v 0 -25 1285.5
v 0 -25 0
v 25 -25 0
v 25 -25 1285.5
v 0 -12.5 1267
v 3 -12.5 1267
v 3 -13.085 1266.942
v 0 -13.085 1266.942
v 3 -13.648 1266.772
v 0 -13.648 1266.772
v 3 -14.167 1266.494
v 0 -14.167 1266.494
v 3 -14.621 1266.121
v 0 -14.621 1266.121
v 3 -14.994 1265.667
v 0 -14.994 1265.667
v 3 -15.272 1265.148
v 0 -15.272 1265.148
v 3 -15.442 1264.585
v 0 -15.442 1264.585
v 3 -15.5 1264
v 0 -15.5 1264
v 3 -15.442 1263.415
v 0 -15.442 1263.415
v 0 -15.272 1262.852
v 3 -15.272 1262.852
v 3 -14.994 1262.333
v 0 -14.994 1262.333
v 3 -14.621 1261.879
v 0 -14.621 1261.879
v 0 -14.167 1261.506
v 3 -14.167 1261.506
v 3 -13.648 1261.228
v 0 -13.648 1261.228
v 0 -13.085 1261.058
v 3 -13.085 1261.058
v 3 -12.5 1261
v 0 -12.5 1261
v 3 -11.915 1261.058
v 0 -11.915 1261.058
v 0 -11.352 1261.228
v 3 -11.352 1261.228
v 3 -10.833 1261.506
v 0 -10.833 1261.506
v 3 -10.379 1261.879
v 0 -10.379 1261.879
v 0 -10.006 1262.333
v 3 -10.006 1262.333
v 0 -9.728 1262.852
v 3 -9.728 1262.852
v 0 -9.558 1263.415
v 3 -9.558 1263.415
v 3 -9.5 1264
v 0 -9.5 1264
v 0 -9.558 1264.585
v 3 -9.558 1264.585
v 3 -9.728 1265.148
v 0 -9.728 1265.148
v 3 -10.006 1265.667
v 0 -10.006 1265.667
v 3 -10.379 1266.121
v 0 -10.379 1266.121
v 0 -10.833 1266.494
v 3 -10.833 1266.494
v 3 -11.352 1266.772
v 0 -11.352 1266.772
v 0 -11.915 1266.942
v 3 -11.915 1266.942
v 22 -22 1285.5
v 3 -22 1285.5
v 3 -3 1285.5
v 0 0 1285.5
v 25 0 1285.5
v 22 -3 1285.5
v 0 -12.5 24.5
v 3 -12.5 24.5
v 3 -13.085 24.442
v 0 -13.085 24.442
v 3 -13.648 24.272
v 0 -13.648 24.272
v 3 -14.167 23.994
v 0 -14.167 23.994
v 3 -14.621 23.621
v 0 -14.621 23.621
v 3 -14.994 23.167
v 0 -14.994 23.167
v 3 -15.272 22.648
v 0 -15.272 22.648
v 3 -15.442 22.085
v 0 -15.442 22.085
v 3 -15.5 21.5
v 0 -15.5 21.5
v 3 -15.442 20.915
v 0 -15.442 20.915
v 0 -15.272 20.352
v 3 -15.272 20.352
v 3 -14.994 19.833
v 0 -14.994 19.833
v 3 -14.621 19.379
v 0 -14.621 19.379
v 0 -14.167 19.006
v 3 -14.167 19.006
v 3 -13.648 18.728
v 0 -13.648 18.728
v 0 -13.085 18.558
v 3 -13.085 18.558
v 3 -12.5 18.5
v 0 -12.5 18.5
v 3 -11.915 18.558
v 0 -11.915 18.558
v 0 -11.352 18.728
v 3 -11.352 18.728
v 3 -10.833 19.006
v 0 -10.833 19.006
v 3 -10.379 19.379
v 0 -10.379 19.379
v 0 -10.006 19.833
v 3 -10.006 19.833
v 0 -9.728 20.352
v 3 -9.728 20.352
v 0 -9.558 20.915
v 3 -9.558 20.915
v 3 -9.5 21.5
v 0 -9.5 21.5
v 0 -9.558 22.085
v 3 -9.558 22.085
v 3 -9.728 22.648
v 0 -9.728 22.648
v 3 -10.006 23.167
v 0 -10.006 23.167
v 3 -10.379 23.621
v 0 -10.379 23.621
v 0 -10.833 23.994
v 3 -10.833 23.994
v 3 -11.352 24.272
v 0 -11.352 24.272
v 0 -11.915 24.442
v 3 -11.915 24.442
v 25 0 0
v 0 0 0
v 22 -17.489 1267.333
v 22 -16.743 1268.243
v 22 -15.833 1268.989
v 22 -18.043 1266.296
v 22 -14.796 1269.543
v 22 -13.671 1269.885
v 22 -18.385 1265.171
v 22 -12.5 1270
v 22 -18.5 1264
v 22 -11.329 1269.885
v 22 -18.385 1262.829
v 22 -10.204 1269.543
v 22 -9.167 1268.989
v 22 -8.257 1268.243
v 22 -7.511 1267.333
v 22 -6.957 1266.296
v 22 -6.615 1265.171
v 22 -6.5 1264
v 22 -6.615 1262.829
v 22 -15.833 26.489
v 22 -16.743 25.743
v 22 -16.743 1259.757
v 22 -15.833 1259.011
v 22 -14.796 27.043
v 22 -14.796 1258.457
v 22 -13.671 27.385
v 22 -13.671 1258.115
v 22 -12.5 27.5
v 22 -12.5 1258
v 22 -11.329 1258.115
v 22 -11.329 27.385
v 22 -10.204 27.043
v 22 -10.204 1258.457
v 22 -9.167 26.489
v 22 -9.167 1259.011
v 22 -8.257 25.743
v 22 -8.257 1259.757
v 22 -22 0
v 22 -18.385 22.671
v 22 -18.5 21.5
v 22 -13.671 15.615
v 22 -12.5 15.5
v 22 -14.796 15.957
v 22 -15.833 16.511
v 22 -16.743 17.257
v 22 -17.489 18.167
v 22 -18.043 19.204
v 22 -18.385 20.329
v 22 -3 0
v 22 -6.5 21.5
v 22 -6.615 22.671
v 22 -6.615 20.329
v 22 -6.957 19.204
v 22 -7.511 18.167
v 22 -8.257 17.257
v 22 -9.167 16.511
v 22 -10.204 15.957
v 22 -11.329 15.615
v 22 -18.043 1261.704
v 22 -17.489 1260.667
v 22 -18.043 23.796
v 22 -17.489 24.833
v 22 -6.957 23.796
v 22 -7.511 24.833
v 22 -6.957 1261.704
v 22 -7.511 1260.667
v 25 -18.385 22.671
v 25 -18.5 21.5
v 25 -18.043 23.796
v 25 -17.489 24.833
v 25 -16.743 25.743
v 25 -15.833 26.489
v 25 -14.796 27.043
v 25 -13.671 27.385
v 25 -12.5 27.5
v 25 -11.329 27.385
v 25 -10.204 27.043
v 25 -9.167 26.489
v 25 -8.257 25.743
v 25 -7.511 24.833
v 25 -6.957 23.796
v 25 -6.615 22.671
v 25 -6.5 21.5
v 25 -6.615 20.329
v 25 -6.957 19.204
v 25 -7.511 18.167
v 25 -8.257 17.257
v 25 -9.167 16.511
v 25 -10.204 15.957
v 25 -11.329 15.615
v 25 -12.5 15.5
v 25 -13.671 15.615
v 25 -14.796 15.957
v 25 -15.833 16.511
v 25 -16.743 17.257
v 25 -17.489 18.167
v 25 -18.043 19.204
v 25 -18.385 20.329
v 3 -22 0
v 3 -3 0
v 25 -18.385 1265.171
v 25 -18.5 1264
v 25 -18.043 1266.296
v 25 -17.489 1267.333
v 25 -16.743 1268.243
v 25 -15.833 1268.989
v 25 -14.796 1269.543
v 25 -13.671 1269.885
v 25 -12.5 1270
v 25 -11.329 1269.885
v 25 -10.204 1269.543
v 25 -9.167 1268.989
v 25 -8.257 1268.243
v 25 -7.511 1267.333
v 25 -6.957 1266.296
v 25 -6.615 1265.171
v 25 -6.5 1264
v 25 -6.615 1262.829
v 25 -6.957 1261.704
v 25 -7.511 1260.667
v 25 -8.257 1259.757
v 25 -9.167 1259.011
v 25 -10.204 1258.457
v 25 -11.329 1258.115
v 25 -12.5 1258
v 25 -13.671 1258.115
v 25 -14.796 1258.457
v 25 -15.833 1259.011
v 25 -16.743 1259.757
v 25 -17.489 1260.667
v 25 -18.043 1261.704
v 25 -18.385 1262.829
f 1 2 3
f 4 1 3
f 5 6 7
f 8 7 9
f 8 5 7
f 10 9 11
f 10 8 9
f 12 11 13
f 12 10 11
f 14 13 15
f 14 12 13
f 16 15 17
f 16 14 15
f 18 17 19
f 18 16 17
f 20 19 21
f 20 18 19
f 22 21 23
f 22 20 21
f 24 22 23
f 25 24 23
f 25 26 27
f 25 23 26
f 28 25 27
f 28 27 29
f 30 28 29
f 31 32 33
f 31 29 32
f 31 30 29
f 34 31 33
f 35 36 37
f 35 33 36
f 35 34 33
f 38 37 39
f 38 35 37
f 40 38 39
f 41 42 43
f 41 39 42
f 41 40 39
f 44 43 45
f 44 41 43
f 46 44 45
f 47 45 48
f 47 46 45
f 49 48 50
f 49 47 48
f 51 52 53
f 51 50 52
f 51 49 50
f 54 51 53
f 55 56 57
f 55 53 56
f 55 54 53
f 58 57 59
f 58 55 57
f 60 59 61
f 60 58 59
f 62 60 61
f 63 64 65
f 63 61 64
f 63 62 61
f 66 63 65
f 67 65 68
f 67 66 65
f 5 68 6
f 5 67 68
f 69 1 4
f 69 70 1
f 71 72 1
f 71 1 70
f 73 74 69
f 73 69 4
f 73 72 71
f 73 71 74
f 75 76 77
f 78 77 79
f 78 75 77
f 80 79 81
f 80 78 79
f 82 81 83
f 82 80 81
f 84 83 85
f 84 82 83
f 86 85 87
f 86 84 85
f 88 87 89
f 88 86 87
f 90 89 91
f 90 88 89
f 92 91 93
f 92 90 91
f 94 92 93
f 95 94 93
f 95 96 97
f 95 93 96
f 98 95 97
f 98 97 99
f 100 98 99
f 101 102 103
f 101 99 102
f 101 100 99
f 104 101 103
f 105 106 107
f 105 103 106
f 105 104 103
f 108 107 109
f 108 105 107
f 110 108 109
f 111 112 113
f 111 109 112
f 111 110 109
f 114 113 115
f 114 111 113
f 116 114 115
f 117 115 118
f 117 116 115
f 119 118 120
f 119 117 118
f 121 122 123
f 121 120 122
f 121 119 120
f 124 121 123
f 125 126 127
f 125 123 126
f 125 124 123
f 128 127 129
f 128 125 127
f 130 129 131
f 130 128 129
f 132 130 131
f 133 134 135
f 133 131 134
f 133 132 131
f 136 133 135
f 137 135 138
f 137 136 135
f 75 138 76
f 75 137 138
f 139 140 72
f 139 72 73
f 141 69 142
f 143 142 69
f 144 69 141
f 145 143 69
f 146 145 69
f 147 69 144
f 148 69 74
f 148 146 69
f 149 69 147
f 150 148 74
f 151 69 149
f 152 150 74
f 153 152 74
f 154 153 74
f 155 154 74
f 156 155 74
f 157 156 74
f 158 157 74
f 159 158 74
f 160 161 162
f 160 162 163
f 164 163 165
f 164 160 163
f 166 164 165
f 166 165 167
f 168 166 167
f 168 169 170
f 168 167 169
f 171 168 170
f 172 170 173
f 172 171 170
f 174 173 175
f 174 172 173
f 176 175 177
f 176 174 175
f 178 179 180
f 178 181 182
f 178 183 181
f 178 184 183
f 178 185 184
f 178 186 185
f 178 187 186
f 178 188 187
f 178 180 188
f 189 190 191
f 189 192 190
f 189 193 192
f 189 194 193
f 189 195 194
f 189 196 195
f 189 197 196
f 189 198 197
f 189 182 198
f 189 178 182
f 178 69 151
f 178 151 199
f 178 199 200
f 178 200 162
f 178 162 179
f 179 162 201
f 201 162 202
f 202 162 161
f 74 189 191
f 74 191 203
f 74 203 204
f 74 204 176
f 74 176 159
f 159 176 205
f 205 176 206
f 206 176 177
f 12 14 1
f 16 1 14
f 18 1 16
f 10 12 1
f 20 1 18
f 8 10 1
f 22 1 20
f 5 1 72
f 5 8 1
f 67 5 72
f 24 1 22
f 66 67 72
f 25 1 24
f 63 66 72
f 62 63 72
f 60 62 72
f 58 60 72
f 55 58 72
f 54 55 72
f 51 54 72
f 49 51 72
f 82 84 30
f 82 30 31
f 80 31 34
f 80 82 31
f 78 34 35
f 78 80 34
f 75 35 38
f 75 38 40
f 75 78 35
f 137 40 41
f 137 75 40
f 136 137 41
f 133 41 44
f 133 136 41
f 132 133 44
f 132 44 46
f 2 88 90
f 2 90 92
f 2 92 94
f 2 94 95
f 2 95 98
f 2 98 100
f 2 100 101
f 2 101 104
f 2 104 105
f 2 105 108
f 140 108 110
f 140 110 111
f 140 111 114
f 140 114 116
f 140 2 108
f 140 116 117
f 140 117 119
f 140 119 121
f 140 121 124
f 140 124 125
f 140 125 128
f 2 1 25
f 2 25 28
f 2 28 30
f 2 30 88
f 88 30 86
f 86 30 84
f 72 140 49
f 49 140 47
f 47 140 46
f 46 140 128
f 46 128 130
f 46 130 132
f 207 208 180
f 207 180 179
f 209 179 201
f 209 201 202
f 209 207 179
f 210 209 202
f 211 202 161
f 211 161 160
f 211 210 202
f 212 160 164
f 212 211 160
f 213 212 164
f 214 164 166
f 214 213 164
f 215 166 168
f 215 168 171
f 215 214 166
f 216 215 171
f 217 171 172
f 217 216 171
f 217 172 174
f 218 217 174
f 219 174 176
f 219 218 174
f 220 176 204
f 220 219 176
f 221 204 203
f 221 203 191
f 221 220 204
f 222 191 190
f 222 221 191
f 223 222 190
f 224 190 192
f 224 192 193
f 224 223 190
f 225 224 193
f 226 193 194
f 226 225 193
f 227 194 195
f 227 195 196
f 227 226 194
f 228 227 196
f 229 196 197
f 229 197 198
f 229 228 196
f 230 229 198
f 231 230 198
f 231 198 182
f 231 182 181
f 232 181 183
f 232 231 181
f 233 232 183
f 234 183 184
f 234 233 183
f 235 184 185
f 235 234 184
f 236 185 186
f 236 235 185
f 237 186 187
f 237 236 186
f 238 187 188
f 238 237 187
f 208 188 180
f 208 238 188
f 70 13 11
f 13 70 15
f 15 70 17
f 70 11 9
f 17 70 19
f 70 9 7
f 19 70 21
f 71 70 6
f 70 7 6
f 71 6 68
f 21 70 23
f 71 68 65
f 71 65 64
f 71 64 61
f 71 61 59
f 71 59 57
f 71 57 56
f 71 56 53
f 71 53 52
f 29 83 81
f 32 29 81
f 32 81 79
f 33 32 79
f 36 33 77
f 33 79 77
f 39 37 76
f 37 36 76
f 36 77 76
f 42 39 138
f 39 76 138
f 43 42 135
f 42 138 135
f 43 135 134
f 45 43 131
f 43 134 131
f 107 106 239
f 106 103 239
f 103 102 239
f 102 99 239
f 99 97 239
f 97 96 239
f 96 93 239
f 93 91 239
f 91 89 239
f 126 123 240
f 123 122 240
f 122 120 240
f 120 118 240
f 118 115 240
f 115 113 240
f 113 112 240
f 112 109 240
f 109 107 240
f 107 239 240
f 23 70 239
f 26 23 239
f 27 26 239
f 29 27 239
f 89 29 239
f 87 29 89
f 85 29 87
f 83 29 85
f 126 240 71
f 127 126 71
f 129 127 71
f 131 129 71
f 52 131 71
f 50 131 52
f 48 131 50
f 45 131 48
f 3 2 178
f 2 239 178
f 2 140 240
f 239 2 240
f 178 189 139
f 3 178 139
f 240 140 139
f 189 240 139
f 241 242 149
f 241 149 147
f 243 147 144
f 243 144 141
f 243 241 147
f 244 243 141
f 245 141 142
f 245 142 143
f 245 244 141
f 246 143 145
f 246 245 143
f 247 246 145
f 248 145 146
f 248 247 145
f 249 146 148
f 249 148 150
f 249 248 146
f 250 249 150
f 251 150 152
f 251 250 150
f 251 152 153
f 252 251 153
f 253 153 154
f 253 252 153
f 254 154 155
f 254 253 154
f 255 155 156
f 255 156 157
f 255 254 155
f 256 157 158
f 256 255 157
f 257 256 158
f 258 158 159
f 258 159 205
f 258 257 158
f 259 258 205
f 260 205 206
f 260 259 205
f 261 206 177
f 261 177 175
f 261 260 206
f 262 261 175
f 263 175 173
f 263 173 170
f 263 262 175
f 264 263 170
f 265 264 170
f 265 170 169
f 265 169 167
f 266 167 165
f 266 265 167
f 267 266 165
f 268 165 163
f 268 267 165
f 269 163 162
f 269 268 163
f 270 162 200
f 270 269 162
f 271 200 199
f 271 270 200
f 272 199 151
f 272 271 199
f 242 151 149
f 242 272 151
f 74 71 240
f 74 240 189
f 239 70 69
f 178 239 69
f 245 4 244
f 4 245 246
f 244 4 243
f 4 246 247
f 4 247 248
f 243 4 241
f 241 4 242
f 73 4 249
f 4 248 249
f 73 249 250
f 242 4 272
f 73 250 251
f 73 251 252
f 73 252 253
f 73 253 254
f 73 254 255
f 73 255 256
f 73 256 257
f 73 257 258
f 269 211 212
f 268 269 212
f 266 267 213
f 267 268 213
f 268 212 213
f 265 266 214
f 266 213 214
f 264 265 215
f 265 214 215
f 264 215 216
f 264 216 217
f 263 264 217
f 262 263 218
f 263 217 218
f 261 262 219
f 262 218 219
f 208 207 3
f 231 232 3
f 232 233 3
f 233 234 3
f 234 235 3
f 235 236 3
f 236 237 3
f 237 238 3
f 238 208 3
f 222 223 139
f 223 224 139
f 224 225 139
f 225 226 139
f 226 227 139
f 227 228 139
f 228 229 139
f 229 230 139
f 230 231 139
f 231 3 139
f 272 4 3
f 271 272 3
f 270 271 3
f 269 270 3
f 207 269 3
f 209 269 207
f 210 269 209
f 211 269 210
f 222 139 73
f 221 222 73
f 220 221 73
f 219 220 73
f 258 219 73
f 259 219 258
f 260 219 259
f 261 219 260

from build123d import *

# Parameters (mm, degrees)
SKETCH_1_W             = 25
SKETCH_1_H             = 25
SKETCH_1_W_2           = 19
SKETCH_1_H_2           = 19
EXTRUDE_1_DEPTH        = 1285.5
SKETCH_6_R             = 6
CUT_EXTRUDE_1_DEPTH    = 3
PATTERN_LINEAR_1_COUNT = 2
PATTERN_LINEAR_1_PITCH = 1242.5


with BuildPart() as part:
    # 草图1 → 拉伸1 (new body)
    with BuildSketch(Plane.XY):
        with Locations((12.5, -12.5)):
            Rectangle(SKETCH_1_W, SKETCH_1_H)
        with Locations((12.5, -12.5)):
            Rectangle(SKETCH_1_W_2, SKETCH_1_H_2, mode=Mode.SUBTRACT)
    extrude(amount=EXTRUDE_1_DEPTH)

    # 草图4 → Ø6.0 (6) 直径孔1 (revolve, cut)
    with BuildSketch(Plane(origin=(0, -12.5, 1264), x_dir=(0, 0, 1), z_dir=(0, 1, 0))):
        Polygon((0, 0), (0, 31.802581857), (3, 30), (3, 0), align=None)
    hole_wizard_6_0_6_1 = revolve(axis=Axis((-6.35, -12.5, 1264), (1, 0, 0)), mode=Mode.SUBTRACT)

    # 草图6 → 切除-拉伸1 (cut)
    with BuildSketch(Plane.ZY.offset(-25)):
        with Locations(Location((1264, -12.5, 0), (0, 0, 270))):
            Circle(SKETCH_6_R)
    cut_extrude_1 = extrude(amount=CUT_EXTRUDE_1_DEPTH, mode=Mode.SUBTRACT)

    # 阵列(线性)1: Ø6.0 (6) 直径孔1, 切除-拉伸1 ×2
    with Locations(*[(0, 0, -i * PATTERN_LINEAR_1_PITCH) for i in range(1, PATTERN_LINEAR_1_COUNT)]):
        add(hole_wizard_6_0_6_1, mode=Mode.SUBTRACT)
        add(cut_extrude_1, mode=Mode.SUBTRACT)


solid = part.part
